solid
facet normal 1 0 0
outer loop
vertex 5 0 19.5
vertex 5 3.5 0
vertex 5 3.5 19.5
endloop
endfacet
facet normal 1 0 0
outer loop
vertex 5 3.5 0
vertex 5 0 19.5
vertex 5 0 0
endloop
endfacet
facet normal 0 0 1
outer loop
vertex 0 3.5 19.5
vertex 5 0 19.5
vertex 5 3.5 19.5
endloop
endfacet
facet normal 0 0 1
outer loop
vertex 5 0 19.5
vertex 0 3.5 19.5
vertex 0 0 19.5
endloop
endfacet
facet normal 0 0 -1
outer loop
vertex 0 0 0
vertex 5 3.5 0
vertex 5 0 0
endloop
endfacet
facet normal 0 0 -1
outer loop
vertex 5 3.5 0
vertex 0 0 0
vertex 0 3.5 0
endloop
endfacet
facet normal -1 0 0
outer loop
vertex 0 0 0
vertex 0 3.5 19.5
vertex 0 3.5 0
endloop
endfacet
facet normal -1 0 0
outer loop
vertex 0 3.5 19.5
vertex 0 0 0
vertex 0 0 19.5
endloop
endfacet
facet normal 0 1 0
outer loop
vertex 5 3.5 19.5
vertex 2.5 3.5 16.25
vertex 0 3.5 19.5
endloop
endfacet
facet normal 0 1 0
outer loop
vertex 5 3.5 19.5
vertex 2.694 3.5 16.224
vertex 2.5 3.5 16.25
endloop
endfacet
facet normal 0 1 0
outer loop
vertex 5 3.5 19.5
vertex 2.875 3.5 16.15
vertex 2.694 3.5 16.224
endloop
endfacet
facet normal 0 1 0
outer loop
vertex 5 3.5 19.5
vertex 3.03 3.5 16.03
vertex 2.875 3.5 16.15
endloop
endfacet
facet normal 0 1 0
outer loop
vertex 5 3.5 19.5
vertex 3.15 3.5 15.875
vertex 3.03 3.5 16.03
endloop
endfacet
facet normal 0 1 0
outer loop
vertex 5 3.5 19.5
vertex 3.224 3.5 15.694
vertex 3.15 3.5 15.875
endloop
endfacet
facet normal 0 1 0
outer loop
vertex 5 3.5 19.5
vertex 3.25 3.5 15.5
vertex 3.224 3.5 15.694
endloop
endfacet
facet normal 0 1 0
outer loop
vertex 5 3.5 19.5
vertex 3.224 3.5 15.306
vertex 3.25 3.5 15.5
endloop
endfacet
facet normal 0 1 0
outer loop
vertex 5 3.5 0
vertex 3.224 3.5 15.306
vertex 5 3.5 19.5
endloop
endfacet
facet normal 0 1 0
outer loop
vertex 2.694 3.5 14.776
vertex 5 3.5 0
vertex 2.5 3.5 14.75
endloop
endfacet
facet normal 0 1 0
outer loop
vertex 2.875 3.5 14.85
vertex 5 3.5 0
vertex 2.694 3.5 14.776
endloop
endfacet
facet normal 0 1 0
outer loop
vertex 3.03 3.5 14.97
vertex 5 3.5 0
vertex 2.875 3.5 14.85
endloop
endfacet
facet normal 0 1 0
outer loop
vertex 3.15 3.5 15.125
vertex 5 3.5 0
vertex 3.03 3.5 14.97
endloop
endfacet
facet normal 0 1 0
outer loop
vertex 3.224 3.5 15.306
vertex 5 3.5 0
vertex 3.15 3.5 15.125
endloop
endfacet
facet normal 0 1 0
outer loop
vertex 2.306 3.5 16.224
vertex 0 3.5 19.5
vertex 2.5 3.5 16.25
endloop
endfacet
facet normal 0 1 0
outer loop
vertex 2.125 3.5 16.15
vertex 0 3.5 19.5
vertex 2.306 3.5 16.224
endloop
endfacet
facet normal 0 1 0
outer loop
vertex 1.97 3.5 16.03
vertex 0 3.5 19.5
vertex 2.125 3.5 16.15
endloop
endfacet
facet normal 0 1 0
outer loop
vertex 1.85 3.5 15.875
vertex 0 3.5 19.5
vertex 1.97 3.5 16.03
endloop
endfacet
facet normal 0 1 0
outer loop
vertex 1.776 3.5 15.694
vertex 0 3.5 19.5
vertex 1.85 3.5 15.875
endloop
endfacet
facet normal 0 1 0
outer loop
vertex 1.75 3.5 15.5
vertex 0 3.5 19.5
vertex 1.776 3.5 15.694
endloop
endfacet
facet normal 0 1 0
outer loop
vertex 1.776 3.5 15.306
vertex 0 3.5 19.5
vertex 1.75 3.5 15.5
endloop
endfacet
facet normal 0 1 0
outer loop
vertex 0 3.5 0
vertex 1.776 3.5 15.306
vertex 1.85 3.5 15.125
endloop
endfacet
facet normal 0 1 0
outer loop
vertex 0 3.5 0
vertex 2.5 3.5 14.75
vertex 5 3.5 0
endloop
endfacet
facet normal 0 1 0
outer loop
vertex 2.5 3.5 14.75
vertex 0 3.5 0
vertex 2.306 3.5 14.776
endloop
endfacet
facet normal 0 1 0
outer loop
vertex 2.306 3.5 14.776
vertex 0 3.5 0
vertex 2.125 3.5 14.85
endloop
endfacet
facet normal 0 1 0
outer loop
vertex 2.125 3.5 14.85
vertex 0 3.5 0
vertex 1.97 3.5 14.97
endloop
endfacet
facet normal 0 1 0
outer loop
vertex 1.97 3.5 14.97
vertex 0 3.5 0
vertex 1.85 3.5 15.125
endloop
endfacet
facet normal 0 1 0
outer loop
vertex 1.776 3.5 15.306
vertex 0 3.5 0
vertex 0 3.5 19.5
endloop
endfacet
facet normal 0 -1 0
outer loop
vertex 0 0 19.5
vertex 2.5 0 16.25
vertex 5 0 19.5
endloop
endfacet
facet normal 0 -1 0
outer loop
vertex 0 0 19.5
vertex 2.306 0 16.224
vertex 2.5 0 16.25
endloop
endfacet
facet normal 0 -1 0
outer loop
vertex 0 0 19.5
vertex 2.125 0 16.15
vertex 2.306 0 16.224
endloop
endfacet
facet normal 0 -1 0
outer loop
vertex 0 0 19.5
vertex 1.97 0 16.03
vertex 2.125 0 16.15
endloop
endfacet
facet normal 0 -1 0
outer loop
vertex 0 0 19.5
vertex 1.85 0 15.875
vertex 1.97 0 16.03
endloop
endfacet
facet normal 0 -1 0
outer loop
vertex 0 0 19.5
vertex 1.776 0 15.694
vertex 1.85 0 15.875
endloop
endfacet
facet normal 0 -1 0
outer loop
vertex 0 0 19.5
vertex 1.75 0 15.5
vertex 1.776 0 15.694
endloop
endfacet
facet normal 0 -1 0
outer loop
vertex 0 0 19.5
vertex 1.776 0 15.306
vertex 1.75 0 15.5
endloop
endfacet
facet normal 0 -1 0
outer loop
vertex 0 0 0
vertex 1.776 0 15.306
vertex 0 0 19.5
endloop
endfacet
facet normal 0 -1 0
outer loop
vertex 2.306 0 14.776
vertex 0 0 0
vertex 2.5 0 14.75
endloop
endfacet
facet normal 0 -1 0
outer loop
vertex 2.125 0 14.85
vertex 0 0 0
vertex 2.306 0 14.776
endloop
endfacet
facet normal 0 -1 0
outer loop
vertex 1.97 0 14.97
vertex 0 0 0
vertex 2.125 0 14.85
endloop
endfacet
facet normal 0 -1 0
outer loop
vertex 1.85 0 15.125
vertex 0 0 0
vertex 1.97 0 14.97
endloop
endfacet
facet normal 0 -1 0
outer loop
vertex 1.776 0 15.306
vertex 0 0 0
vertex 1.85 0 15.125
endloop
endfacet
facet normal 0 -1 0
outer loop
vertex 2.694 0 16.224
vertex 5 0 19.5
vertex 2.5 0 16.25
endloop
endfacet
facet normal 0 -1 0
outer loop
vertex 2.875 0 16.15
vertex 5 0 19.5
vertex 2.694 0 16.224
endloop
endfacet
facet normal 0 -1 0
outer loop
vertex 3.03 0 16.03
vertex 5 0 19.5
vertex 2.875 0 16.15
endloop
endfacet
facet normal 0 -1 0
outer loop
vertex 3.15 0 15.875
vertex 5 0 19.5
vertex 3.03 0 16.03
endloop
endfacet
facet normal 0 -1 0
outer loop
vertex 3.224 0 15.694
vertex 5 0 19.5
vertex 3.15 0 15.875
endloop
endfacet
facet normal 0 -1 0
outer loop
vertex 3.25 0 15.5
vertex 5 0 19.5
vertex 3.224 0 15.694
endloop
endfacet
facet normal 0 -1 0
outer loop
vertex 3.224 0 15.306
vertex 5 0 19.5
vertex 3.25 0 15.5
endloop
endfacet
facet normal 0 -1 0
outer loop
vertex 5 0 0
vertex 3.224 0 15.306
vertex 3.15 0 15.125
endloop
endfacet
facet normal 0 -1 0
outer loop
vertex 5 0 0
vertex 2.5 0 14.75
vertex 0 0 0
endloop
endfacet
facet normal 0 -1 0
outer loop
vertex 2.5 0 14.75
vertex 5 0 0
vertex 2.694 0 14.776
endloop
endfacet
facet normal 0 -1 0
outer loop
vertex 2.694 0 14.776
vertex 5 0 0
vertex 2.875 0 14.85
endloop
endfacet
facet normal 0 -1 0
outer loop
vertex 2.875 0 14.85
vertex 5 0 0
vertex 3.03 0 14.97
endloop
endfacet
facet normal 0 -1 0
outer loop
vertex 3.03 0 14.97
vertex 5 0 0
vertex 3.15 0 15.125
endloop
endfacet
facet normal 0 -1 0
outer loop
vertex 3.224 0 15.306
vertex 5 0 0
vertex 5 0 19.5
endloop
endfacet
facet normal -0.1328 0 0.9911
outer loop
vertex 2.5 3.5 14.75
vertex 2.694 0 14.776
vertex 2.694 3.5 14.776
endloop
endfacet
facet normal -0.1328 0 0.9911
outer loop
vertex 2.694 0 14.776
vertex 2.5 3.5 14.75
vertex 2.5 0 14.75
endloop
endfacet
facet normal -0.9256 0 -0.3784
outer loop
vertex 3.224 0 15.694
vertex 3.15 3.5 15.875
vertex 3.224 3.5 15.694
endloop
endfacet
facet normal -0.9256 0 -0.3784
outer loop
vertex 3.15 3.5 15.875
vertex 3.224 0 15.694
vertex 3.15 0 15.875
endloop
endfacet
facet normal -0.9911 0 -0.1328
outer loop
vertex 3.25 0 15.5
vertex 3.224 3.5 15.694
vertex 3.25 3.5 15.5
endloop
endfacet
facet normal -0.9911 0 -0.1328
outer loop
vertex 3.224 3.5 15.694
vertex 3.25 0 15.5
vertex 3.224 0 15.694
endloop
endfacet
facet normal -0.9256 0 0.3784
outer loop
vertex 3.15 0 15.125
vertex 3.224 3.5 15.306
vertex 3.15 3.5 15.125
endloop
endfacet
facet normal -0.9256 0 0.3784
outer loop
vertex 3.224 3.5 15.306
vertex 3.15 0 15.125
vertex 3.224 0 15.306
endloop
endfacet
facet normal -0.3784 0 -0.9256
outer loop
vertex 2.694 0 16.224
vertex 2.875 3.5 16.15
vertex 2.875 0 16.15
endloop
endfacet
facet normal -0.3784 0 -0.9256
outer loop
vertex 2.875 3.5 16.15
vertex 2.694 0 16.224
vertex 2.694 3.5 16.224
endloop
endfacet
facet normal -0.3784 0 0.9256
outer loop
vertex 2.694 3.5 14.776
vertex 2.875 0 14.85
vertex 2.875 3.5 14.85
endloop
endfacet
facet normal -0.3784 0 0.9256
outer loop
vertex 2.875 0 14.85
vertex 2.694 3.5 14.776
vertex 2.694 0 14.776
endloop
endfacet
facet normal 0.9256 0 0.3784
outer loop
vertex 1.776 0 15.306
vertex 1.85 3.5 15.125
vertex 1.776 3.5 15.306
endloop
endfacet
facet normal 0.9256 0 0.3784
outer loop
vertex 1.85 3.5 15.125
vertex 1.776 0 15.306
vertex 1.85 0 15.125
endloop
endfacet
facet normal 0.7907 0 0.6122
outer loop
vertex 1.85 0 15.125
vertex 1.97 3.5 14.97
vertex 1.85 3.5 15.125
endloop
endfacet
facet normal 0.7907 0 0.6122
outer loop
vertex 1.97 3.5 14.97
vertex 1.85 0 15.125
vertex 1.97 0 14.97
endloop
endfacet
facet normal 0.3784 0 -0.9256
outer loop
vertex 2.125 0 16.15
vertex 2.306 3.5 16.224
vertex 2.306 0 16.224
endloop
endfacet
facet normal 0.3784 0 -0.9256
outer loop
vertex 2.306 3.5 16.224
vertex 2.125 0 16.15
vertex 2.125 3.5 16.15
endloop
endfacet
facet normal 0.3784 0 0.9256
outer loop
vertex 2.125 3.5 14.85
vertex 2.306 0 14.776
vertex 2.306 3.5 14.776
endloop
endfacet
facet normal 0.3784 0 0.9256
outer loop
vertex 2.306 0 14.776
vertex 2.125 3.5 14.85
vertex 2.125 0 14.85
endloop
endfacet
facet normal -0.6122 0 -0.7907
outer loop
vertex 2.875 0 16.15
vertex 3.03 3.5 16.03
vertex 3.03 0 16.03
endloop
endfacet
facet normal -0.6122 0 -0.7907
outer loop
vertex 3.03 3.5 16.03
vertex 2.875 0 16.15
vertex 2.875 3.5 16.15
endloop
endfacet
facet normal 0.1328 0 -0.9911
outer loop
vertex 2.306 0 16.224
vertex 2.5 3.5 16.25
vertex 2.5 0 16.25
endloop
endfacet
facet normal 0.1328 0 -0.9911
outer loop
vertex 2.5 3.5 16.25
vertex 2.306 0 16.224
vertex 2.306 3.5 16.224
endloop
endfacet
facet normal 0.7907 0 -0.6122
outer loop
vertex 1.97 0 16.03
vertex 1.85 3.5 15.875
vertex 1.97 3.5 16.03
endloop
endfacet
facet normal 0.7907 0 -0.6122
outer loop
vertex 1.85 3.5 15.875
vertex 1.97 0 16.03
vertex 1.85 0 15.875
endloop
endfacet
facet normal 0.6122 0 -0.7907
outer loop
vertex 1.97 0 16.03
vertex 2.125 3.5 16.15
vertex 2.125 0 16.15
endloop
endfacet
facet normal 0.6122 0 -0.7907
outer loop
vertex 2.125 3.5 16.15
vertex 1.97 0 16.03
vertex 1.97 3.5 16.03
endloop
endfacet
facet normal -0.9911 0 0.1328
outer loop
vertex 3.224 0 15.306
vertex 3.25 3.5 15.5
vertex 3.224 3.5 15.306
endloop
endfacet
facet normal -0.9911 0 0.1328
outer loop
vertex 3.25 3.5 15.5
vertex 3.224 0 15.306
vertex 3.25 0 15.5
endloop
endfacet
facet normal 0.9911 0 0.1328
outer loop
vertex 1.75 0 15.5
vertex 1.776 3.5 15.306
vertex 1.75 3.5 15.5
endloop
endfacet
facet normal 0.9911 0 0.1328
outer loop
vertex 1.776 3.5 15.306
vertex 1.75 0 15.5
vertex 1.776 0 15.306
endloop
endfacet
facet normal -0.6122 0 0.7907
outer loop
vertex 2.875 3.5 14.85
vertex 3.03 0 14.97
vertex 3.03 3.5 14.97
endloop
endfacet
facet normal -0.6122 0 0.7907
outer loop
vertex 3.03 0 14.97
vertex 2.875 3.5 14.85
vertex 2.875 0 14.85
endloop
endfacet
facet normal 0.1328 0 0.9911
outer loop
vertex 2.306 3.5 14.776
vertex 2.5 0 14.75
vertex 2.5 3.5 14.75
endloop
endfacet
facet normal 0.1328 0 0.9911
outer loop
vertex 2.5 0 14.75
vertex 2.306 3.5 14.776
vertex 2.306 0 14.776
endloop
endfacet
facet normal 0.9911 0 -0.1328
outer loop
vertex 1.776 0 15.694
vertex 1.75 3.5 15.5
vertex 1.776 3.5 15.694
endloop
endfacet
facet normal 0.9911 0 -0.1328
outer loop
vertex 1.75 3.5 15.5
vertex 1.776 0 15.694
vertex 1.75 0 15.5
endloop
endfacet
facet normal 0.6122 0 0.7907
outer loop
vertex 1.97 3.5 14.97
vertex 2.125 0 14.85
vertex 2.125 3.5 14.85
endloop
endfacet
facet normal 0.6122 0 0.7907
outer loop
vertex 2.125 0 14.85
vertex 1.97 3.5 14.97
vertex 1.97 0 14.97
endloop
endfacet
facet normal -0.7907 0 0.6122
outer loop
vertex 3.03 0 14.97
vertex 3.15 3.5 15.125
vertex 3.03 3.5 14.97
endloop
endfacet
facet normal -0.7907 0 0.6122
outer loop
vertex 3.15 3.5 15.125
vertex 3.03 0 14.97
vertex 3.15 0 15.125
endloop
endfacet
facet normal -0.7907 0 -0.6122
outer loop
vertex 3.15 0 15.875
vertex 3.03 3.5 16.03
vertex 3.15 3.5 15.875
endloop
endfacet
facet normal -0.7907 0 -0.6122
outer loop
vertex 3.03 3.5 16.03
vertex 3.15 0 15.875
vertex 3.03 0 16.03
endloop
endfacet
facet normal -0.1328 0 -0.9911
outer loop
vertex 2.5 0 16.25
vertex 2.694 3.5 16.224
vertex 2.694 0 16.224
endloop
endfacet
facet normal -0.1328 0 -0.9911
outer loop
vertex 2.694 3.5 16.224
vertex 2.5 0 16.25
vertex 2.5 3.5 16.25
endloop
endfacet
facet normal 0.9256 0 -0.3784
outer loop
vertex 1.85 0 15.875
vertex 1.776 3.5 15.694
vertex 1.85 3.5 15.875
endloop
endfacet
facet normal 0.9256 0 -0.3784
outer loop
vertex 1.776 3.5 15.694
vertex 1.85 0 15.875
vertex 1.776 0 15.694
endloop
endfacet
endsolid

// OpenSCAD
// part_id: fp7
// name: Front plate support post (short)
// source_drawing_ids: DRW-010
// units: mm
// revision: 0.1
// SPDX-License-Identifier: MIT

module part_fp7(
    width = 5.0,
    depth = 3.5,
    height = 19.5,
    hole_d = 1.5,
    hole_z = 15.5
) {
    difference() {
        cube([width, depth, height], center = false);
        translate([width / 2, depth / 2, hole_z]) rotate([90, 0, 0])
            cylinder(d = hole_d, h = depth + 0.2, center = true, $fn = 24);
    }
}

// ---- "main guard" ----
// Default to previewing when opened directly:
if (is_undef(__LIB_MODE__)) {
    part_fp7();
}
